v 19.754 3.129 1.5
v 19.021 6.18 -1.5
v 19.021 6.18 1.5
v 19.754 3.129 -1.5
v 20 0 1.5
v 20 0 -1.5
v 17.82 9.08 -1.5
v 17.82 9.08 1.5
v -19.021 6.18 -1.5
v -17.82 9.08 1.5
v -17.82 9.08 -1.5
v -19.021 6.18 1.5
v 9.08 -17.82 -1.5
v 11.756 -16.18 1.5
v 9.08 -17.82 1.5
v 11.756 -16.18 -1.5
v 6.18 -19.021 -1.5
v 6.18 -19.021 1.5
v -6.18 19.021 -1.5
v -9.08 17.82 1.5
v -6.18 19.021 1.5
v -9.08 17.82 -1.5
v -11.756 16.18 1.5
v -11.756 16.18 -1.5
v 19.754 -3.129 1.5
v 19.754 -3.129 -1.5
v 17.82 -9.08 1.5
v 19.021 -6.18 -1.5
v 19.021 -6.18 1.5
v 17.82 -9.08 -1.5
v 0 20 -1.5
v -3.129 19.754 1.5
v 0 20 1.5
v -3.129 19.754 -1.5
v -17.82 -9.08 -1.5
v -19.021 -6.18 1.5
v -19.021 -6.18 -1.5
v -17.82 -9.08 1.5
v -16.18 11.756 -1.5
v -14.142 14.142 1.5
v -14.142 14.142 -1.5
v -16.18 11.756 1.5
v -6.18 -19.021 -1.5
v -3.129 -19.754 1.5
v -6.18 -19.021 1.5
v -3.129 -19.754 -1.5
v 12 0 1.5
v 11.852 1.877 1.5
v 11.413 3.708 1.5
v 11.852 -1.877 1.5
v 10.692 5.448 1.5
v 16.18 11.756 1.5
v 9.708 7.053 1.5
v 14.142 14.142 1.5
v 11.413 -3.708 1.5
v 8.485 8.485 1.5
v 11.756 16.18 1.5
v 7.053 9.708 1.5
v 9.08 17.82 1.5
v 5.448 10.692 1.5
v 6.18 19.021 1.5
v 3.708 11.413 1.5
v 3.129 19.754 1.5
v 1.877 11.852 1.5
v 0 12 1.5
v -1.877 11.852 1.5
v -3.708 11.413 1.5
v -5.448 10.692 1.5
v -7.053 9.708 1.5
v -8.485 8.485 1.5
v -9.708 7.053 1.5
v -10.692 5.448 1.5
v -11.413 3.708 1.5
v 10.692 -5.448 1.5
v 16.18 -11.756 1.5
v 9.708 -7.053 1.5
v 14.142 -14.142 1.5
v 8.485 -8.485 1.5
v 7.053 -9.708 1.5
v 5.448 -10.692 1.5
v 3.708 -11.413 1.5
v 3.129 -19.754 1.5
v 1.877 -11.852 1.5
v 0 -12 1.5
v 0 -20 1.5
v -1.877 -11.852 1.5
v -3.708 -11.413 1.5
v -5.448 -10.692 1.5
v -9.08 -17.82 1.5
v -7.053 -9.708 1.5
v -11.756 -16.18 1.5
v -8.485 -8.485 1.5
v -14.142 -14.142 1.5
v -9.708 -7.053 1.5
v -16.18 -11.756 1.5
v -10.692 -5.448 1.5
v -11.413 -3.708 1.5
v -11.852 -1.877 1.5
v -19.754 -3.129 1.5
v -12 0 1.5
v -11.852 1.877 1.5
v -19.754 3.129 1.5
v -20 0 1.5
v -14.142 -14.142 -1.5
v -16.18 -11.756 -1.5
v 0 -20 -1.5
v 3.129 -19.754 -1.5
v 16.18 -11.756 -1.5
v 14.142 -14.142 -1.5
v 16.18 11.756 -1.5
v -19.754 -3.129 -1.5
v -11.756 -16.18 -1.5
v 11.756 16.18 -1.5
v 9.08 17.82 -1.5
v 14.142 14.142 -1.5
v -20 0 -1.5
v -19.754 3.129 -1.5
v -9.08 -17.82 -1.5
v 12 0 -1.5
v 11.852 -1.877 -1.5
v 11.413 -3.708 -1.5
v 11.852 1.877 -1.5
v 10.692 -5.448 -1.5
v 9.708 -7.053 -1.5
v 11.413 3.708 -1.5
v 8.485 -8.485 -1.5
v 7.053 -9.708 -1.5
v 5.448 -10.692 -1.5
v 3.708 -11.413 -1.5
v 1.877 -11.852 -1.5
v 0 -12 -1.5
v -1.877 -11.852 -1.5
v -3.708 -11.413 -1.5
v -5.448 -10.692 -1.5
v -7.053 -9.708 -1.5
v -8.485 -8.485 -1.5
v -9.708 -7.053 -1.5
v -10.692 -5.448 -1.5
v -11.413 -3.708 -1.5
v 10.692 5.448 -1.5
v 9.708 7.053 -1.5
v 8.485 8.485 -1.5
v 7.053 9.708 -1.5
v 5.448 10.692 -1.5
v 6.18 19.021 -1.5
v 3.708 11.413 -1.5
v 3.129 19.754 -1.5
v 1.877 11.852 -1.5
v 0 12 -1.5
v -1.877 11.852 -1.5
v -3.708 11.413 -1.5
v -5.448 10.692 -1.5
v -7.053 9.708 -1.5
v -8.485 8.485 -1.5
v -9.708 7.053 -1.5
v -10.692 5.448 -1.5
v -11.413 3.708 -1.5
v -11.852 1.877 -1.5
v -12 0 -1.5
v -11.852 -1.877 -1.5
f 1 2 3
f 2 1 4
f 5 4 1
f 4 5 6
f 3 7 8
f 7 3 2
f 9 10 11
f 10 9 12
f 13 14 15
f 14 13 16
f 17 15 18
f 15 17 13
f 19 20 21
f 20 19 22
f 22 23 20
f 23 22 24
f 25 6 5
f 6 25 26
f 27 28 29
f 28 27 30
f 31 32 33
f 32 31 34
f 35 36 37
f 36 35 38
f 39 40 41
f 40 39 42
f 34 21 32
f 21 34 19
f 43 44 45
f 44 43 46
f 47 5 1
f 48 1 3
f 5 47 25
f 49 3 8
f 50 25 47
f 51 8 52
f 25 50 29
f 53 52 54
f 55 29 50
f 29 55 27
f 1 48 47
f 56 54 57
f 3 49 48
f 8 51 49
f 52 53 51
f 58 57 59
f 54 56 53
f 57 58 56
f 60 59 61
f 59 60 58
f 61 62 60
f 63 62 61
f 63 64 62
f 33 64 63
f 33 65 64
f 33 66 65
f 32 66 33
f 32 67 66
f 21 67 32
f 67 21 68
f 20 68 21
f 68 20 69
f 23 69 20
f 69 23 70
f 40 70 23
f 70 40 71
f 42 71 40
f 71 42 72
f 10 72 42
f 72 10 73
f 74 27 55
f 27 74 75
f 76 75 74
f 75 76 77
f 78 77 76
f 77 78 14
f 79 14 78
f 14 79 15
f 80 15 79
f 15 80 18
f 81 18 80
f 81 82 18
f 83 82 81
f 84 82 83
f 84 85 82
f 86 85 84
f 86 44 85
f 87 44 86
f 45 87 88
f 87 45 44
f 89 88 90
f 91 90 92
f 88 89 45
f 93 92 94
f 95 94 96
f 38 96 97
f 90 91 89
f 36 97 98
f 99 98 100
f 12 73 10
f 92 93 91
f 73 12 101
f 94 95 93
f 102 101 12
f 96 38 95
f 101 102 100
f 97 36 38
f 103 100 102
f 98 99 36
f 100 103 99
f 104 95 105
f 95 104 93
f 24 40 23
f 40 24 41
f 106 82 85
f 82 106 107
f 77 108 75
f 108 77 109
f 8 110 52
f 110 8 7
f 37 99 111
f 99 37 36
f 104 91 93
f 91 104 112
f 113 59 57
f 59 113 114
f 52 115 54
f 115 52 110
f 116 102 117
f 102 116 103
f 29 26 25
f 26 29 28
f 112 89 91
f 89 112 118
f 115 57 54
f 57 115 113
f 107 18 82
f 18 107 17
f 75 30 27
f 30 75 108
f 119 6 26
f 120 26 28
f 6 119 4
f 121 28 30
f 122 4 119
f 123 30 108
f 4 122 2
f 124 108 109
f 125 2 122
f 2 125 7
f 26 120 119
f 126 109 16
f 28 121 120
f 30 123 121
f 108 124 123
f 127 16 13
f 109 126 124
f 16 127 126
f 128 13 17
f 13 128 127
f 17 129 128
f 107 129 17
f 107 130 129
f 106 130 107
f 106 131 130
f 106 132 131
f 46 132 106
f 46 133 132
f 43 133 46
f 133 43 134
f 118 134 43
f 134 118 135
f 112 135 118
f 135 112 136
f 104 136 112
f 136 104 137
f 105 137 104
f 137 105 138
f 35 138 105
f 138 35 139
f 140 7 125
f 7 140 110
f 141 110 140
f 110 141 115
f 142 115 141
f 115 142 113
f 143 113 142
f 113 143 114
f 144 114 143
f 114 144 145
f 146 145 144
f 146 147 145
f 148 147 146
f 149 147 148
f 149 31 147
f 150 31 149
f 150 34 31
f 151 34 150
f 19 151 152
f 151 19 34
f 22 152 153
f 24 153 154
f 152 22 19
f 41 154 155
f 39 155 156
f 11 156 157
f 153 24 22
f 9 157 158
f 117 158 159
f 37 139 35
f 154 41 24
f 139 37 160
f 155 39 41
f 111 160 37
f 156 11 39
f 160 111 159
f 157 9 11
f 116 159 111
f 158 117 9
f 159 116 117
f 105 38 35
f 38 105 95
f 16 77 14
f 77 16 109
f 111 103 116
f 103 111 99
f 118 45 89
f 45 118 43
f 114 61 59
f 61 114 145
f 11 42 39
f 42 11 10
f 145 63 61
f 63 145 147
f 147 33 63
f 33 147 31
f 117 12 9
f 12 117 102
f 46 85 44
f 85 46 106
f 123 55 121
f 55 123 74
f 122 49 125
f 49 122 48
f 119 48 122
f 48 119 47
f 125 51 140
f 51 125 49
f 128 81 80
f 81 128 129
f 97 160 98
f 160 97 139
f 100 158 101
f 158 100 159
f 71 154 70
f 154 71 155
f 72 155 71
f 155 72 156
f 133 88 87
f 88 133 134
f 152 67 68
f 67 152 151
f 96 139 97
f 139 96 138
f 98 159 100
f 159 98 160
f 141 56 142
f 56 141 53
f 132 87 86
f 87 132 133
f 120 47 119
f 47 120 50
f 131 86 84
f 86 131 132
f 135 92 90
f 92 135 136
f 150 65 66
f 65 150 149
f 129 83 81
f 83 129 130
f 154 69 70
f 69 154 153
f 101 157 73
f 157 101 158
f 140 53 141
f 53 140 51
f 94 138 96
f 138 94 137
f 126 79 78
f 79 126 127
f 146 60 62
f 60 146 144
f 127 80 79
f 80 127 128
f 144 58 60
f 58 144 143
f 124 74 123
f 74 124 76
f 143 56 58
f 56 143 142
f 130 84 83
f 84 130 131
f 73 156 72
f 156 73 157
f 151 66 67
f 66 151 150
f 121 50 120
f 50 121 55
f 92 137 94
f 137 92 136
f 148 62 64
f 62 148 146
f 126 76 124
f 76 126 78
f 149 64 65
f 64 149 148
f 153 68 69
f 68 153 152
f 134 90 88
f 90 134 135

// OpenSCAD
module Washer(Di = 10,De = 20,S = 3){
    color("#86919c")
    difference(){
        cylinder(S,20,20, center= true, $fn = 40);
        cylinder(S+2,Di,Di, center= true, $fn = 40);
    }
}

Washer(12);

// Written by Nicolì Angelo (Gengio) 2024: 
// MIT License

//Permission is hereby granted, free of charge, to any person obtaining a copy of this software and associated documentation files (the "Software"), to deal in the Software without restriction, including without limitation the rights to use, copy, modify, merge, publish, distribute, sublicense, and/or sell copies of the Software, and to permit persons to whom the Software is furnished to do so, subject to the following conditions:

//The above copyright notice and this permission notice shall be included in all copies or substantial portions of the Software.

//THE SOFTWARE IS PROVIDED "AS IS", WITHOUT WARRANTY OF ANY KIND, EXPRESS OR IMPLIED, INCLUDING BUT NOT LIMITED TO THE WARRANTIES OF MERCHANTABILITY, FITNESS FOR A PARTICULAR PURPOSE AND NONINFRINGEMENT. IN NO EVENT SHALL THE AUTHORS OR COPYRIGHT HOLDERS BE LIABLE FOR ANY CLAIM, DAMAGES OR OTHER LIABILITY, WHETHER IN AN ACTION OF CONTRACT, TORT OR OTHERWISE, ARISING FROM, OUT OF OR IN CONNECTION WITH THE SOFTWARE OR THE USE OR OTHER DEALINGS IN THE SOFTWARE.
